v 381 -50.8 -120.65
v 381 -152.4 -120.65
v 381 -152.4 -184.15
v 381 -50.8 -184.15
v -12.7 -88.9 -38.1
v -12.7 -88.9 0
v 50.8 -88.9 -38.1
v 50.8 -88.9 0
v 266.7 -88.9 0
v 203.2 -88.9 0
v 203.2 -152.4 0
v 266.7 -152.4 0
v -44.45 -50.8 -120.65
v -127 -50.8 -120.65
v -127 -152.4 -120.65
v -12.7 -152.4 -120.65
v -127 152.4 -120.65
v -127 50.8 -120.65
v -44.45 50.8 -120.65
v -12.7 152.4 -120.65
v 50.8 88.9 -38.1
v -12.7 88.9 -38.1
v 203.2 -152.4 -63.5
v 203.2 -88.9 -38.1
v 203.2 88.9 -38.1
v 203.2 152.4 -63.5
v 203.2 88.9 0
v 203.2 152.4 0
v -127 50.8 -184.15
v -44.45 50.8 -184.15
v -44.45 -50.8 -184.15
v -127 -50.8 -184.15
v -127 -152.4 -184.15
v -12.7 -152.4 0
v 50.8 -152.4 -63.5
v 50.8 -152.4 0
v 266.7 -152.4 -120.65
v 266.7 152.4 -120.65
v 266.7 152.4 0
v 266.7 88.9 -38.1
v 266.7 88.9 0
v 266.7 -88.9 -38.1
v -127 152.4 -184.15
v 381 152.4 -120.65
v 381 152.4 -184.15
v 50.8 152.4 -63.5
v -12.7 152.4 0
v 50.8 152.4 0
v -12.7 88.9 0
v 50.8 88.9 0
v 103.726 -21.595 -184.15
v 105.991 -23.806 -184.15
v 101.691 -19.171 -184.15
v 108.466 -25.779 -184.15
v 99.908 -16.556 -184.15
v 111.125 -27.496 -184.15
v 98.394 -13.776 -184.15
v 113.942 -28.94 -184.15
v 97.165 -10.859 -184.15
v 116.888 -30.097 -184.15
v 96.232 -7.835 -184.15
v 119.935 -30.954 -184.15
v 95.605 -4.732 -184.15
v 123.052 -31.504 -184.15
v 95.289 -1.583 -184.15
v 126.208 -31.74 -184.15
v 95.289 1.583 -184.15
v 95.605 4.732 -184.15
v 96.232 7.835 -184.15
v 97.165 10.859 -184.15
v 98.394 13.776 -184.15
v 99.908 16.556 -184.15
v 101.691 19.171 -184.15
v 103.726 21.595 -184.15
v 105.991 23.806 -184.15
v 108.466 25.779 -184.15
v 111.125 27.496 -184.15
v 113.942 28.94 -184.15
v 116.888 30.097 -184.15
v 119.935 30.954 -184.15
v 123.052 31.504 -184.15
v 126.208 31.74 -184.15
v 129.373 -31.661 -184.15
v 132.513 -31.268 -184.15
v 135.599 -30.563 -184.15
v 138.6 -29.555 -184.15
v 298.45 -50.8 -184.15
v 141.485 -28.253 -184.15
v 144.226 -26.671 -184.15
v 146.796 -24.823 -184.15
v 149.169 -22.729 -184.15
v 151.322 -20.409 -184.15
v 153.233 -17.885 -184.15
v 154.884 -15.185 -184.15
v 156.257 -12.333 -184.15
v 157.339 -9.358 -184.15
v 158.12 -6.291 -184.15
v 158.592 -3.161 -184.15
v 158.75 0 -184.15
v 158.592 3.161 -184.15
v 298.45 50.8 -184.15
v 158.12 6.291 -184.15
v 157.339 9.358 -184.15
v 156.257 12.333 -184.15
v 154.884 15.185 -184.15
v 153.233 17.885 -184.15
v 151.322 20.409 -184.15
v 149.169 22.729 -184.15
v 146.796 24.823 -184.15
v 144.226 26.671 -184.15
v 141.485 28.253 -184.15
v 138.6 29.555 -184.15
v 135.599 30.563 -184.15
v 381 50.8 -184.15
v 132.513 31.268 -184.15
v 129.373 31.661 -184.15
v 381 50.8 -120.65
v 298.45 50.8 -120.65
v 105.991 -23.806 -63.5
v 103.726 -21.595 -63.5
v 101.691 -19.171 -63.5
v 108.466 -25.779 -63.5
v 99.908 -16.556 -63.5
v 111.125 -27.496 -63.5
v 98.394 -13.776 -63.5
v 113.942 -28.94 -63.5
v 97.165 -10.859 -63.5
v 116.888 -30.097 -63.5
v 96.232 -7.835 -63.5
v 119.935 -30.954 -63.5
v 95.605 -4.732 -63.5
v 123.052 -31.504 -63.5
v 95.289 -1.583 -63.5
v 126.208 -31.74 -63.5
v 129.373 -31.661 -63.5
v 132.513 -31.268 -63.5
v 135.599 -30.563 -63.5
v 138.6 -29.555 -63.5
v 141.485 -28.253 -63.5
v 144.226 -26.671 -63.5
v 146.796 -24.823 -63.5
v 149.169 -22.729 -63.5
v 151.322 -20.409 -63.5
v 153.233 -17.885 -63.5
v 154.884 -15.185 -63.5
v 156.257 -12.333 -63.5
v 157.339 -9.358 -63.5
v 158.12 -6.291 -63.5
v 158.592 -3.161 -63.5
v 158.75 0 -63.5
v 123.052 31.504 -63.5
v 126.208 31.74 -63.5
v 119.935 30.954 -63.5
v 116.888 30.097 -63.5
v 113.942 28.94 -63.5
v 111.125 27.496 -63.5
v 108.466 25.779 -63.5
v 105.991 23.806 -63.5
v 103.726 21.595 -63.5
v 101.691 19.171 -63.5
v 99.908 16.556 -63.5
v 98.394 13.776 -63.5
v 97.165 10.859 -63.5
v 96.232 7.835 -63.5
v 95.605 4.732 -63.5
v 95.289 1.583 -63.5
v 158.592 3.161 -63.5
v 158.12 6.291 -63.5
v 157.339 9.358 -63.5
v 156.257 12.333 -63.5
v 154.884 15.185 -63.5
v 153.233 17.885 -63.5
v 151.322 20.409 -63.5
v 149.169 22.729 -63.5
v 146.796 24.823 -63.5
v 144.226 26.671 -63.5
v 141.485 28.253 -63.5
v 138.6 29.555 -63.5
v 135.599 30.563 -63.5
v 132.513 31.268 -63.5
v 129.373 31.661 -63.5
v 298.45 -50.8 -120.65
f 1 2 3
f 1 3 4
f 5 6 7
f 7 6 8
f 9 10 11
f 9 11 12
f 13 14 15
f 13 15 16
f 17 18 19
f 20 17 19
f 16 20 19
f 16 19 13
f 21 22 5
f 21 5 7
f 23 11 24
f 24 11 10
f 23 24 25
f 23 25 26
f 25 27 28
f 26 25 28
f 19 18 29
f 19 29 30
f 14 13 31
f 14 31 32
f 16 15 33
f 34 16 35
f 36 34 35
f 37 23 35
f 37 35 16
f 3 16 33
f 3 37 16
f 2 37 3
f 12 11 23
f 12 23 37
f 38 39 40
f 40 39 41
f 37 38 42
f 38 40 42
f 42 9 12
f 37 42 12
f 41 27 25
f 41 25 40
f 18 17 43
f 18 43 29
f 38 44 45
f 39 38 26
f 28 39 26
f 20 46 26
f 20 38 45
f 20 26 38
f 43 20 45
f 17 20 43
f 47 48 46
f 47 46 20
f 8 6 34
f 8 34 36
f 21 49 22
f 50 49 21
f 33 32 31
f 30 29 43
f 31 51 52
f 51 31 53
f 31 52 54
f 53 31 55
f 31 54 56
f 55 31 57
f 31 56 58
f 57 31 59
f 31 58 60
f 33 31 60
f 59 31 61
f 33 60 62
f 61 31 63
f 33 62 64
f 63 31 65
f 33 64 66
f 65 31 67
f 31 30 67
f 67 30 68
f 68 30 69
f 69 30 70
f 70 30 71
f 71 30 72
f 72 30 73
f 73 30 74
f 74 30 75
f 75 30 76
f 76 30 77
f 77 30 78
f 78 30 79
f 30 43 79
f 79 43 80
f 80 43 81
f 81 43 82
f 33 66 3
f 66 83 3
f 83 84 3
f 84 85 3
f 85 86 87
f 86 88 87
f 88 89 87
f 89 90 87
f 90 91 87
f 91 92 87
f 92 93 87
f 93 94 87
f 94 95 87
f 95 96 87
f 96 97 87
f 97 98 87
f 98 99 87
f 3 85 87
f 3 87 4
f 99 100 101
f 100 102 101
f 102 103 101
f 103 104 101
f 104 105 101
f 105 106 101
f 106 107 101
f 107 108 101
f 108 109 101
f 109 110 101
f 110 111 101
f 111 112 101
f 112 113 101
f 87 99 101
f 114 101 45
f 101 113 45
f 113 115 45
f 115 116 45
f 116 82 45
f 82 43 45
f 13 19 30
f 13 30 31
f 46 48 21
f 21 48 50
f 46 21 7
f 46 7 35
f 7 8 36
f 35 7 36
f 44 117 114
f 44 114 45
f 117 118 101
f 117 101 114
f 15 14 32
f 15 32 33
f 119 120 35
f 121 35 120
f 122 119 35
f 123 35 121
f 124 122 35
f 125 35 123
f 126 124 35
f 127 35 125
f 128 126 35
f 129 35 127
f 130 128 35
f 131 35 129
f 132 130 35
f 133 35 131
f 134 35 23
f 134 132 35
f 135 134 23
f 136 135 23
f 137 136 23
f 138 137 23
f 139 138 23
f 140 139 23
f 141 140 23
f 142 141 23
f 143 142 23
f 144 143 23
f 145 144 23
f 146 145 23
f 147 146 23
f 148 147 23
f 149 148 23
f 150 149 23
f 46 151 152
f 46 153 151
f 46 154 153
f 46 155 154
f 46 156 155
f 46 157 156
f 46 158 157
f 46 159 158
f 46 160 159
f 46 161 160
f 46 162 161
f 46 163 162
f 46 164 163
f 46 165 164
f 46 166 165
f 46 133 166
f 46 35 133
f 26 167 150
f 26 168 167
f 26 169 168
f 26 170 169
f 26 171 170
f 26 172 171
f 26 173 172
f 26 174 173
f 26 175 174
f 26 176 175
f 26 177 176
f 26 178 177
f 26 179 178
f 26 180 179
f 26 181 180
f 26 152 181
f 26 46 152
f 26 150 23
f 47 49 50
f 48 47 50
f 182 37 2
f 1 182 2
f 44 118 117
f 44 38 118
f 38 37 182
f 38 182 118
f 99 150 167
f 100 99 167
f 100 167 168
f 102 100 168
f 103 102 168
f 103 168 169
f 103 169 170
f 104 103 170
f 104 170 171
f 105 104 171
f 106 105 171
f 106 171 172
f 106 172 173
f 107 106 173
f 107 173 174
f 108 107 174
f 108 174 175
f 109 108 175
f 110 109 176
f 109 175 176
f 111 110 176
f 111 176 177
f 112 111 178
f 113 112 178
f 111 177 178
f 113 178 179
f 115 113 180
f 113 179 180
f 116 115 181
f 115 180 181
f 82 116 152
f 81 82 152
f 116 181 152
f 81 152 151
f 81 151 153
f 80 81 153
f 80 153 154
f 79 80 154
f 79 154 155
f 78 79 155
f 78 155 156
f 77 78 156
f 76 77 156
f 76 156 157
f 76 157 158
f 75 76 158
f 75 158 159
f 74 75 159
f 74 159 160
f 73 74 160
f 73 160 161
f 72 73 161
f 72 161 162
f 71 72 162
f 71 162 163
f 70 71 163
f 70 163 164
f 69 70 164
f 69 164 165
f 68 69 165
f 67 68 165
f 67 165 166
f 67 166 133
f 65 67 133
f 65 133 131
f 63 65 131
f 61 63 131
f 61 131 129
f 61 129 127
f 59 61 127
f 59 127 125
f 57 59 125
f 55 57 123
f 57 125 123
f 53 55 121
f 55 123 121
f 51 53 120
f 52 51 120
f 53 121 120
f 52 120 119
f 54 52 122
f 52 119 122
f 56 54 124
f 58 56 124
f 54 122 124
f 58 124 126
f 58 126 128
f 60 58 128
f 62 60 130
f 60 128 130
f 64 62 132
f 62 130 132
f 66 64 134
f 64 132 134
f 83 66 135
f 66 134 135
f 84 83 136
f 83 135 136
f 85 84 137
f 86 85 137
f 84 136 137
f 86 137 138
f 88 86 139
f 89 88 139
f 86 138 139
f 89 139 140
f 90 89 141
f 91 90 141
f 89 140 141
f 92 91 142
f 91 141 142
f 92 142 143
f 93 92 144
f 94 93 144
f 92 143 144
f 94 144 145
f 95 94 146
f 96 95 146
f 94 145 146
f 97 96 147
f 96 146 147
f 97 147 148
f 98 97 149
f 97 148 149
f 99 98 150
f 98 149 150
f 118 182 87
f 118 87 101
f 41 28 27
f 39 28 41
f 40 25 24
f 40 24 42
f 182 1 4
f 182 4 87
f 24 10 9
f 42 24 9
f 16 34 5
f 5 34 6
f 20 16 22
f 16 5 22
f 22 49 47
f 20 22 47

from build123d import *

# Parameters (mm, degrees)
F0_W     = 63.5
F0_H     = 63.5
F0_H_2   = 177.8
F0_R     = 31.75
F1_DEPTH = 184.15
F2_DEPTH = 120.65
F3_DEPTH = 63.5
F4_DEPTH = 38.1


with BuildPart() as f1:
    # F0 (on Top) → F1 (new body)
    with BuildSketch(Plane.XY):
        Polygon((-12.7, 152.4), (-127, 152.4), (-127, 50.8), (-44.45, 50.8), (-44.45, -50.8), (-127, -50.8), (-127, -152.4), (-12.7, -152.4), (-12.7, -88.9), (-12.7, 88.9), align=None)
        with Locations((19.05, 120.65)):
            Rectangle(F0_W, F0_H)
        with Locations((19.05, 0)):
            Rectangle(F0_W, F0_H_2)
        with Locations((19.05, -120.65)):
            Rectangle(F0_W, F0_H)
        with Locations((234.95, 0)):
            Rectangle(F0_W, F0_H_2)
        with Locations((234.95, 120.65)):
            Rectangle(F0_W, F0_H)
        with Locations((234.95, -120.65)):
            Rectangle(F0_W, F0_H)
        Polygon((381, 152.4), (266.7, 152.4), (266.7, 88.9), (266.7, -88.9), (266.7, -152.4), (381, -152.4), (381, -50.8), (298.45, -50.8), (298.45, 50.8), (381, 50.8), align=None)
        Polygon((203.2, 152.4), (50.8, 152.4), (50.8, 88.9), (50.8, -88.9), (50.8, -152.4), (203.2, -152.4), (203.2, -88.9), (203.2, 88.9), align=None)
        with Locations((127, 0)):
            Circle(F0_R, mode=Mode.SUBTRACT)
    extrude(amount=-F1_DEPTH)

    # F0 (on Top) → F2 (cut)
    with BuildSketch(Plane.XY):
        Polygon((-12.7, 152.4), (-127, 152.4), (-127, 50.8), (-44.45, 50.8), (-44.45, -50.8), (-127, -50.8), (-127, -152.4), (-12.7, -152.4), (-12.7, -88.9), (-12.7, 88.9), align=None)
        Polygon((381, 152.4), (266.7, 152.4), (266.7, 88.9), (266.7, -88.9), (266.7, -152.4), (381, -152.4), (381, -50.8), (298.45, -50.8), (298.45, 50.8), (381, 50.8), align=None)
    extrude(amount=-F2_DEPTH, mode=Mode.SUBTRACT)

    # F0 (on Top) → F3 (cut)
    with BuildSketch(Plane.XY):
        Polygon((203.2, 152.4), (50.8, 152.4), (50.8, 88.9), (50.8, -88.9), (50.8, -152.4), (203.2, -152.4), (203.2, -88.9), (203.2, 88.9), align=None)
        with Locations((127, 0)):
            Circle(F0_R, mode=Mode.SUBTRACT)
    extrude(amount=-F3_DEPTH, mode=Mode.SUBTRACT)

    # F0 (on Top) → F4 (cut)
    with BuildSketch(Plane.XY):
        with Locations((19.05, 0)):
            Rectangle(F0_W, F0_H_2)
        with Locations((234.95, 0)):
            Rectangle(F0_W, F0_H_2)
    extrude(amount=-F4_DEPTH, mode=Mode.SUBTRACT)


solid = f1.part
